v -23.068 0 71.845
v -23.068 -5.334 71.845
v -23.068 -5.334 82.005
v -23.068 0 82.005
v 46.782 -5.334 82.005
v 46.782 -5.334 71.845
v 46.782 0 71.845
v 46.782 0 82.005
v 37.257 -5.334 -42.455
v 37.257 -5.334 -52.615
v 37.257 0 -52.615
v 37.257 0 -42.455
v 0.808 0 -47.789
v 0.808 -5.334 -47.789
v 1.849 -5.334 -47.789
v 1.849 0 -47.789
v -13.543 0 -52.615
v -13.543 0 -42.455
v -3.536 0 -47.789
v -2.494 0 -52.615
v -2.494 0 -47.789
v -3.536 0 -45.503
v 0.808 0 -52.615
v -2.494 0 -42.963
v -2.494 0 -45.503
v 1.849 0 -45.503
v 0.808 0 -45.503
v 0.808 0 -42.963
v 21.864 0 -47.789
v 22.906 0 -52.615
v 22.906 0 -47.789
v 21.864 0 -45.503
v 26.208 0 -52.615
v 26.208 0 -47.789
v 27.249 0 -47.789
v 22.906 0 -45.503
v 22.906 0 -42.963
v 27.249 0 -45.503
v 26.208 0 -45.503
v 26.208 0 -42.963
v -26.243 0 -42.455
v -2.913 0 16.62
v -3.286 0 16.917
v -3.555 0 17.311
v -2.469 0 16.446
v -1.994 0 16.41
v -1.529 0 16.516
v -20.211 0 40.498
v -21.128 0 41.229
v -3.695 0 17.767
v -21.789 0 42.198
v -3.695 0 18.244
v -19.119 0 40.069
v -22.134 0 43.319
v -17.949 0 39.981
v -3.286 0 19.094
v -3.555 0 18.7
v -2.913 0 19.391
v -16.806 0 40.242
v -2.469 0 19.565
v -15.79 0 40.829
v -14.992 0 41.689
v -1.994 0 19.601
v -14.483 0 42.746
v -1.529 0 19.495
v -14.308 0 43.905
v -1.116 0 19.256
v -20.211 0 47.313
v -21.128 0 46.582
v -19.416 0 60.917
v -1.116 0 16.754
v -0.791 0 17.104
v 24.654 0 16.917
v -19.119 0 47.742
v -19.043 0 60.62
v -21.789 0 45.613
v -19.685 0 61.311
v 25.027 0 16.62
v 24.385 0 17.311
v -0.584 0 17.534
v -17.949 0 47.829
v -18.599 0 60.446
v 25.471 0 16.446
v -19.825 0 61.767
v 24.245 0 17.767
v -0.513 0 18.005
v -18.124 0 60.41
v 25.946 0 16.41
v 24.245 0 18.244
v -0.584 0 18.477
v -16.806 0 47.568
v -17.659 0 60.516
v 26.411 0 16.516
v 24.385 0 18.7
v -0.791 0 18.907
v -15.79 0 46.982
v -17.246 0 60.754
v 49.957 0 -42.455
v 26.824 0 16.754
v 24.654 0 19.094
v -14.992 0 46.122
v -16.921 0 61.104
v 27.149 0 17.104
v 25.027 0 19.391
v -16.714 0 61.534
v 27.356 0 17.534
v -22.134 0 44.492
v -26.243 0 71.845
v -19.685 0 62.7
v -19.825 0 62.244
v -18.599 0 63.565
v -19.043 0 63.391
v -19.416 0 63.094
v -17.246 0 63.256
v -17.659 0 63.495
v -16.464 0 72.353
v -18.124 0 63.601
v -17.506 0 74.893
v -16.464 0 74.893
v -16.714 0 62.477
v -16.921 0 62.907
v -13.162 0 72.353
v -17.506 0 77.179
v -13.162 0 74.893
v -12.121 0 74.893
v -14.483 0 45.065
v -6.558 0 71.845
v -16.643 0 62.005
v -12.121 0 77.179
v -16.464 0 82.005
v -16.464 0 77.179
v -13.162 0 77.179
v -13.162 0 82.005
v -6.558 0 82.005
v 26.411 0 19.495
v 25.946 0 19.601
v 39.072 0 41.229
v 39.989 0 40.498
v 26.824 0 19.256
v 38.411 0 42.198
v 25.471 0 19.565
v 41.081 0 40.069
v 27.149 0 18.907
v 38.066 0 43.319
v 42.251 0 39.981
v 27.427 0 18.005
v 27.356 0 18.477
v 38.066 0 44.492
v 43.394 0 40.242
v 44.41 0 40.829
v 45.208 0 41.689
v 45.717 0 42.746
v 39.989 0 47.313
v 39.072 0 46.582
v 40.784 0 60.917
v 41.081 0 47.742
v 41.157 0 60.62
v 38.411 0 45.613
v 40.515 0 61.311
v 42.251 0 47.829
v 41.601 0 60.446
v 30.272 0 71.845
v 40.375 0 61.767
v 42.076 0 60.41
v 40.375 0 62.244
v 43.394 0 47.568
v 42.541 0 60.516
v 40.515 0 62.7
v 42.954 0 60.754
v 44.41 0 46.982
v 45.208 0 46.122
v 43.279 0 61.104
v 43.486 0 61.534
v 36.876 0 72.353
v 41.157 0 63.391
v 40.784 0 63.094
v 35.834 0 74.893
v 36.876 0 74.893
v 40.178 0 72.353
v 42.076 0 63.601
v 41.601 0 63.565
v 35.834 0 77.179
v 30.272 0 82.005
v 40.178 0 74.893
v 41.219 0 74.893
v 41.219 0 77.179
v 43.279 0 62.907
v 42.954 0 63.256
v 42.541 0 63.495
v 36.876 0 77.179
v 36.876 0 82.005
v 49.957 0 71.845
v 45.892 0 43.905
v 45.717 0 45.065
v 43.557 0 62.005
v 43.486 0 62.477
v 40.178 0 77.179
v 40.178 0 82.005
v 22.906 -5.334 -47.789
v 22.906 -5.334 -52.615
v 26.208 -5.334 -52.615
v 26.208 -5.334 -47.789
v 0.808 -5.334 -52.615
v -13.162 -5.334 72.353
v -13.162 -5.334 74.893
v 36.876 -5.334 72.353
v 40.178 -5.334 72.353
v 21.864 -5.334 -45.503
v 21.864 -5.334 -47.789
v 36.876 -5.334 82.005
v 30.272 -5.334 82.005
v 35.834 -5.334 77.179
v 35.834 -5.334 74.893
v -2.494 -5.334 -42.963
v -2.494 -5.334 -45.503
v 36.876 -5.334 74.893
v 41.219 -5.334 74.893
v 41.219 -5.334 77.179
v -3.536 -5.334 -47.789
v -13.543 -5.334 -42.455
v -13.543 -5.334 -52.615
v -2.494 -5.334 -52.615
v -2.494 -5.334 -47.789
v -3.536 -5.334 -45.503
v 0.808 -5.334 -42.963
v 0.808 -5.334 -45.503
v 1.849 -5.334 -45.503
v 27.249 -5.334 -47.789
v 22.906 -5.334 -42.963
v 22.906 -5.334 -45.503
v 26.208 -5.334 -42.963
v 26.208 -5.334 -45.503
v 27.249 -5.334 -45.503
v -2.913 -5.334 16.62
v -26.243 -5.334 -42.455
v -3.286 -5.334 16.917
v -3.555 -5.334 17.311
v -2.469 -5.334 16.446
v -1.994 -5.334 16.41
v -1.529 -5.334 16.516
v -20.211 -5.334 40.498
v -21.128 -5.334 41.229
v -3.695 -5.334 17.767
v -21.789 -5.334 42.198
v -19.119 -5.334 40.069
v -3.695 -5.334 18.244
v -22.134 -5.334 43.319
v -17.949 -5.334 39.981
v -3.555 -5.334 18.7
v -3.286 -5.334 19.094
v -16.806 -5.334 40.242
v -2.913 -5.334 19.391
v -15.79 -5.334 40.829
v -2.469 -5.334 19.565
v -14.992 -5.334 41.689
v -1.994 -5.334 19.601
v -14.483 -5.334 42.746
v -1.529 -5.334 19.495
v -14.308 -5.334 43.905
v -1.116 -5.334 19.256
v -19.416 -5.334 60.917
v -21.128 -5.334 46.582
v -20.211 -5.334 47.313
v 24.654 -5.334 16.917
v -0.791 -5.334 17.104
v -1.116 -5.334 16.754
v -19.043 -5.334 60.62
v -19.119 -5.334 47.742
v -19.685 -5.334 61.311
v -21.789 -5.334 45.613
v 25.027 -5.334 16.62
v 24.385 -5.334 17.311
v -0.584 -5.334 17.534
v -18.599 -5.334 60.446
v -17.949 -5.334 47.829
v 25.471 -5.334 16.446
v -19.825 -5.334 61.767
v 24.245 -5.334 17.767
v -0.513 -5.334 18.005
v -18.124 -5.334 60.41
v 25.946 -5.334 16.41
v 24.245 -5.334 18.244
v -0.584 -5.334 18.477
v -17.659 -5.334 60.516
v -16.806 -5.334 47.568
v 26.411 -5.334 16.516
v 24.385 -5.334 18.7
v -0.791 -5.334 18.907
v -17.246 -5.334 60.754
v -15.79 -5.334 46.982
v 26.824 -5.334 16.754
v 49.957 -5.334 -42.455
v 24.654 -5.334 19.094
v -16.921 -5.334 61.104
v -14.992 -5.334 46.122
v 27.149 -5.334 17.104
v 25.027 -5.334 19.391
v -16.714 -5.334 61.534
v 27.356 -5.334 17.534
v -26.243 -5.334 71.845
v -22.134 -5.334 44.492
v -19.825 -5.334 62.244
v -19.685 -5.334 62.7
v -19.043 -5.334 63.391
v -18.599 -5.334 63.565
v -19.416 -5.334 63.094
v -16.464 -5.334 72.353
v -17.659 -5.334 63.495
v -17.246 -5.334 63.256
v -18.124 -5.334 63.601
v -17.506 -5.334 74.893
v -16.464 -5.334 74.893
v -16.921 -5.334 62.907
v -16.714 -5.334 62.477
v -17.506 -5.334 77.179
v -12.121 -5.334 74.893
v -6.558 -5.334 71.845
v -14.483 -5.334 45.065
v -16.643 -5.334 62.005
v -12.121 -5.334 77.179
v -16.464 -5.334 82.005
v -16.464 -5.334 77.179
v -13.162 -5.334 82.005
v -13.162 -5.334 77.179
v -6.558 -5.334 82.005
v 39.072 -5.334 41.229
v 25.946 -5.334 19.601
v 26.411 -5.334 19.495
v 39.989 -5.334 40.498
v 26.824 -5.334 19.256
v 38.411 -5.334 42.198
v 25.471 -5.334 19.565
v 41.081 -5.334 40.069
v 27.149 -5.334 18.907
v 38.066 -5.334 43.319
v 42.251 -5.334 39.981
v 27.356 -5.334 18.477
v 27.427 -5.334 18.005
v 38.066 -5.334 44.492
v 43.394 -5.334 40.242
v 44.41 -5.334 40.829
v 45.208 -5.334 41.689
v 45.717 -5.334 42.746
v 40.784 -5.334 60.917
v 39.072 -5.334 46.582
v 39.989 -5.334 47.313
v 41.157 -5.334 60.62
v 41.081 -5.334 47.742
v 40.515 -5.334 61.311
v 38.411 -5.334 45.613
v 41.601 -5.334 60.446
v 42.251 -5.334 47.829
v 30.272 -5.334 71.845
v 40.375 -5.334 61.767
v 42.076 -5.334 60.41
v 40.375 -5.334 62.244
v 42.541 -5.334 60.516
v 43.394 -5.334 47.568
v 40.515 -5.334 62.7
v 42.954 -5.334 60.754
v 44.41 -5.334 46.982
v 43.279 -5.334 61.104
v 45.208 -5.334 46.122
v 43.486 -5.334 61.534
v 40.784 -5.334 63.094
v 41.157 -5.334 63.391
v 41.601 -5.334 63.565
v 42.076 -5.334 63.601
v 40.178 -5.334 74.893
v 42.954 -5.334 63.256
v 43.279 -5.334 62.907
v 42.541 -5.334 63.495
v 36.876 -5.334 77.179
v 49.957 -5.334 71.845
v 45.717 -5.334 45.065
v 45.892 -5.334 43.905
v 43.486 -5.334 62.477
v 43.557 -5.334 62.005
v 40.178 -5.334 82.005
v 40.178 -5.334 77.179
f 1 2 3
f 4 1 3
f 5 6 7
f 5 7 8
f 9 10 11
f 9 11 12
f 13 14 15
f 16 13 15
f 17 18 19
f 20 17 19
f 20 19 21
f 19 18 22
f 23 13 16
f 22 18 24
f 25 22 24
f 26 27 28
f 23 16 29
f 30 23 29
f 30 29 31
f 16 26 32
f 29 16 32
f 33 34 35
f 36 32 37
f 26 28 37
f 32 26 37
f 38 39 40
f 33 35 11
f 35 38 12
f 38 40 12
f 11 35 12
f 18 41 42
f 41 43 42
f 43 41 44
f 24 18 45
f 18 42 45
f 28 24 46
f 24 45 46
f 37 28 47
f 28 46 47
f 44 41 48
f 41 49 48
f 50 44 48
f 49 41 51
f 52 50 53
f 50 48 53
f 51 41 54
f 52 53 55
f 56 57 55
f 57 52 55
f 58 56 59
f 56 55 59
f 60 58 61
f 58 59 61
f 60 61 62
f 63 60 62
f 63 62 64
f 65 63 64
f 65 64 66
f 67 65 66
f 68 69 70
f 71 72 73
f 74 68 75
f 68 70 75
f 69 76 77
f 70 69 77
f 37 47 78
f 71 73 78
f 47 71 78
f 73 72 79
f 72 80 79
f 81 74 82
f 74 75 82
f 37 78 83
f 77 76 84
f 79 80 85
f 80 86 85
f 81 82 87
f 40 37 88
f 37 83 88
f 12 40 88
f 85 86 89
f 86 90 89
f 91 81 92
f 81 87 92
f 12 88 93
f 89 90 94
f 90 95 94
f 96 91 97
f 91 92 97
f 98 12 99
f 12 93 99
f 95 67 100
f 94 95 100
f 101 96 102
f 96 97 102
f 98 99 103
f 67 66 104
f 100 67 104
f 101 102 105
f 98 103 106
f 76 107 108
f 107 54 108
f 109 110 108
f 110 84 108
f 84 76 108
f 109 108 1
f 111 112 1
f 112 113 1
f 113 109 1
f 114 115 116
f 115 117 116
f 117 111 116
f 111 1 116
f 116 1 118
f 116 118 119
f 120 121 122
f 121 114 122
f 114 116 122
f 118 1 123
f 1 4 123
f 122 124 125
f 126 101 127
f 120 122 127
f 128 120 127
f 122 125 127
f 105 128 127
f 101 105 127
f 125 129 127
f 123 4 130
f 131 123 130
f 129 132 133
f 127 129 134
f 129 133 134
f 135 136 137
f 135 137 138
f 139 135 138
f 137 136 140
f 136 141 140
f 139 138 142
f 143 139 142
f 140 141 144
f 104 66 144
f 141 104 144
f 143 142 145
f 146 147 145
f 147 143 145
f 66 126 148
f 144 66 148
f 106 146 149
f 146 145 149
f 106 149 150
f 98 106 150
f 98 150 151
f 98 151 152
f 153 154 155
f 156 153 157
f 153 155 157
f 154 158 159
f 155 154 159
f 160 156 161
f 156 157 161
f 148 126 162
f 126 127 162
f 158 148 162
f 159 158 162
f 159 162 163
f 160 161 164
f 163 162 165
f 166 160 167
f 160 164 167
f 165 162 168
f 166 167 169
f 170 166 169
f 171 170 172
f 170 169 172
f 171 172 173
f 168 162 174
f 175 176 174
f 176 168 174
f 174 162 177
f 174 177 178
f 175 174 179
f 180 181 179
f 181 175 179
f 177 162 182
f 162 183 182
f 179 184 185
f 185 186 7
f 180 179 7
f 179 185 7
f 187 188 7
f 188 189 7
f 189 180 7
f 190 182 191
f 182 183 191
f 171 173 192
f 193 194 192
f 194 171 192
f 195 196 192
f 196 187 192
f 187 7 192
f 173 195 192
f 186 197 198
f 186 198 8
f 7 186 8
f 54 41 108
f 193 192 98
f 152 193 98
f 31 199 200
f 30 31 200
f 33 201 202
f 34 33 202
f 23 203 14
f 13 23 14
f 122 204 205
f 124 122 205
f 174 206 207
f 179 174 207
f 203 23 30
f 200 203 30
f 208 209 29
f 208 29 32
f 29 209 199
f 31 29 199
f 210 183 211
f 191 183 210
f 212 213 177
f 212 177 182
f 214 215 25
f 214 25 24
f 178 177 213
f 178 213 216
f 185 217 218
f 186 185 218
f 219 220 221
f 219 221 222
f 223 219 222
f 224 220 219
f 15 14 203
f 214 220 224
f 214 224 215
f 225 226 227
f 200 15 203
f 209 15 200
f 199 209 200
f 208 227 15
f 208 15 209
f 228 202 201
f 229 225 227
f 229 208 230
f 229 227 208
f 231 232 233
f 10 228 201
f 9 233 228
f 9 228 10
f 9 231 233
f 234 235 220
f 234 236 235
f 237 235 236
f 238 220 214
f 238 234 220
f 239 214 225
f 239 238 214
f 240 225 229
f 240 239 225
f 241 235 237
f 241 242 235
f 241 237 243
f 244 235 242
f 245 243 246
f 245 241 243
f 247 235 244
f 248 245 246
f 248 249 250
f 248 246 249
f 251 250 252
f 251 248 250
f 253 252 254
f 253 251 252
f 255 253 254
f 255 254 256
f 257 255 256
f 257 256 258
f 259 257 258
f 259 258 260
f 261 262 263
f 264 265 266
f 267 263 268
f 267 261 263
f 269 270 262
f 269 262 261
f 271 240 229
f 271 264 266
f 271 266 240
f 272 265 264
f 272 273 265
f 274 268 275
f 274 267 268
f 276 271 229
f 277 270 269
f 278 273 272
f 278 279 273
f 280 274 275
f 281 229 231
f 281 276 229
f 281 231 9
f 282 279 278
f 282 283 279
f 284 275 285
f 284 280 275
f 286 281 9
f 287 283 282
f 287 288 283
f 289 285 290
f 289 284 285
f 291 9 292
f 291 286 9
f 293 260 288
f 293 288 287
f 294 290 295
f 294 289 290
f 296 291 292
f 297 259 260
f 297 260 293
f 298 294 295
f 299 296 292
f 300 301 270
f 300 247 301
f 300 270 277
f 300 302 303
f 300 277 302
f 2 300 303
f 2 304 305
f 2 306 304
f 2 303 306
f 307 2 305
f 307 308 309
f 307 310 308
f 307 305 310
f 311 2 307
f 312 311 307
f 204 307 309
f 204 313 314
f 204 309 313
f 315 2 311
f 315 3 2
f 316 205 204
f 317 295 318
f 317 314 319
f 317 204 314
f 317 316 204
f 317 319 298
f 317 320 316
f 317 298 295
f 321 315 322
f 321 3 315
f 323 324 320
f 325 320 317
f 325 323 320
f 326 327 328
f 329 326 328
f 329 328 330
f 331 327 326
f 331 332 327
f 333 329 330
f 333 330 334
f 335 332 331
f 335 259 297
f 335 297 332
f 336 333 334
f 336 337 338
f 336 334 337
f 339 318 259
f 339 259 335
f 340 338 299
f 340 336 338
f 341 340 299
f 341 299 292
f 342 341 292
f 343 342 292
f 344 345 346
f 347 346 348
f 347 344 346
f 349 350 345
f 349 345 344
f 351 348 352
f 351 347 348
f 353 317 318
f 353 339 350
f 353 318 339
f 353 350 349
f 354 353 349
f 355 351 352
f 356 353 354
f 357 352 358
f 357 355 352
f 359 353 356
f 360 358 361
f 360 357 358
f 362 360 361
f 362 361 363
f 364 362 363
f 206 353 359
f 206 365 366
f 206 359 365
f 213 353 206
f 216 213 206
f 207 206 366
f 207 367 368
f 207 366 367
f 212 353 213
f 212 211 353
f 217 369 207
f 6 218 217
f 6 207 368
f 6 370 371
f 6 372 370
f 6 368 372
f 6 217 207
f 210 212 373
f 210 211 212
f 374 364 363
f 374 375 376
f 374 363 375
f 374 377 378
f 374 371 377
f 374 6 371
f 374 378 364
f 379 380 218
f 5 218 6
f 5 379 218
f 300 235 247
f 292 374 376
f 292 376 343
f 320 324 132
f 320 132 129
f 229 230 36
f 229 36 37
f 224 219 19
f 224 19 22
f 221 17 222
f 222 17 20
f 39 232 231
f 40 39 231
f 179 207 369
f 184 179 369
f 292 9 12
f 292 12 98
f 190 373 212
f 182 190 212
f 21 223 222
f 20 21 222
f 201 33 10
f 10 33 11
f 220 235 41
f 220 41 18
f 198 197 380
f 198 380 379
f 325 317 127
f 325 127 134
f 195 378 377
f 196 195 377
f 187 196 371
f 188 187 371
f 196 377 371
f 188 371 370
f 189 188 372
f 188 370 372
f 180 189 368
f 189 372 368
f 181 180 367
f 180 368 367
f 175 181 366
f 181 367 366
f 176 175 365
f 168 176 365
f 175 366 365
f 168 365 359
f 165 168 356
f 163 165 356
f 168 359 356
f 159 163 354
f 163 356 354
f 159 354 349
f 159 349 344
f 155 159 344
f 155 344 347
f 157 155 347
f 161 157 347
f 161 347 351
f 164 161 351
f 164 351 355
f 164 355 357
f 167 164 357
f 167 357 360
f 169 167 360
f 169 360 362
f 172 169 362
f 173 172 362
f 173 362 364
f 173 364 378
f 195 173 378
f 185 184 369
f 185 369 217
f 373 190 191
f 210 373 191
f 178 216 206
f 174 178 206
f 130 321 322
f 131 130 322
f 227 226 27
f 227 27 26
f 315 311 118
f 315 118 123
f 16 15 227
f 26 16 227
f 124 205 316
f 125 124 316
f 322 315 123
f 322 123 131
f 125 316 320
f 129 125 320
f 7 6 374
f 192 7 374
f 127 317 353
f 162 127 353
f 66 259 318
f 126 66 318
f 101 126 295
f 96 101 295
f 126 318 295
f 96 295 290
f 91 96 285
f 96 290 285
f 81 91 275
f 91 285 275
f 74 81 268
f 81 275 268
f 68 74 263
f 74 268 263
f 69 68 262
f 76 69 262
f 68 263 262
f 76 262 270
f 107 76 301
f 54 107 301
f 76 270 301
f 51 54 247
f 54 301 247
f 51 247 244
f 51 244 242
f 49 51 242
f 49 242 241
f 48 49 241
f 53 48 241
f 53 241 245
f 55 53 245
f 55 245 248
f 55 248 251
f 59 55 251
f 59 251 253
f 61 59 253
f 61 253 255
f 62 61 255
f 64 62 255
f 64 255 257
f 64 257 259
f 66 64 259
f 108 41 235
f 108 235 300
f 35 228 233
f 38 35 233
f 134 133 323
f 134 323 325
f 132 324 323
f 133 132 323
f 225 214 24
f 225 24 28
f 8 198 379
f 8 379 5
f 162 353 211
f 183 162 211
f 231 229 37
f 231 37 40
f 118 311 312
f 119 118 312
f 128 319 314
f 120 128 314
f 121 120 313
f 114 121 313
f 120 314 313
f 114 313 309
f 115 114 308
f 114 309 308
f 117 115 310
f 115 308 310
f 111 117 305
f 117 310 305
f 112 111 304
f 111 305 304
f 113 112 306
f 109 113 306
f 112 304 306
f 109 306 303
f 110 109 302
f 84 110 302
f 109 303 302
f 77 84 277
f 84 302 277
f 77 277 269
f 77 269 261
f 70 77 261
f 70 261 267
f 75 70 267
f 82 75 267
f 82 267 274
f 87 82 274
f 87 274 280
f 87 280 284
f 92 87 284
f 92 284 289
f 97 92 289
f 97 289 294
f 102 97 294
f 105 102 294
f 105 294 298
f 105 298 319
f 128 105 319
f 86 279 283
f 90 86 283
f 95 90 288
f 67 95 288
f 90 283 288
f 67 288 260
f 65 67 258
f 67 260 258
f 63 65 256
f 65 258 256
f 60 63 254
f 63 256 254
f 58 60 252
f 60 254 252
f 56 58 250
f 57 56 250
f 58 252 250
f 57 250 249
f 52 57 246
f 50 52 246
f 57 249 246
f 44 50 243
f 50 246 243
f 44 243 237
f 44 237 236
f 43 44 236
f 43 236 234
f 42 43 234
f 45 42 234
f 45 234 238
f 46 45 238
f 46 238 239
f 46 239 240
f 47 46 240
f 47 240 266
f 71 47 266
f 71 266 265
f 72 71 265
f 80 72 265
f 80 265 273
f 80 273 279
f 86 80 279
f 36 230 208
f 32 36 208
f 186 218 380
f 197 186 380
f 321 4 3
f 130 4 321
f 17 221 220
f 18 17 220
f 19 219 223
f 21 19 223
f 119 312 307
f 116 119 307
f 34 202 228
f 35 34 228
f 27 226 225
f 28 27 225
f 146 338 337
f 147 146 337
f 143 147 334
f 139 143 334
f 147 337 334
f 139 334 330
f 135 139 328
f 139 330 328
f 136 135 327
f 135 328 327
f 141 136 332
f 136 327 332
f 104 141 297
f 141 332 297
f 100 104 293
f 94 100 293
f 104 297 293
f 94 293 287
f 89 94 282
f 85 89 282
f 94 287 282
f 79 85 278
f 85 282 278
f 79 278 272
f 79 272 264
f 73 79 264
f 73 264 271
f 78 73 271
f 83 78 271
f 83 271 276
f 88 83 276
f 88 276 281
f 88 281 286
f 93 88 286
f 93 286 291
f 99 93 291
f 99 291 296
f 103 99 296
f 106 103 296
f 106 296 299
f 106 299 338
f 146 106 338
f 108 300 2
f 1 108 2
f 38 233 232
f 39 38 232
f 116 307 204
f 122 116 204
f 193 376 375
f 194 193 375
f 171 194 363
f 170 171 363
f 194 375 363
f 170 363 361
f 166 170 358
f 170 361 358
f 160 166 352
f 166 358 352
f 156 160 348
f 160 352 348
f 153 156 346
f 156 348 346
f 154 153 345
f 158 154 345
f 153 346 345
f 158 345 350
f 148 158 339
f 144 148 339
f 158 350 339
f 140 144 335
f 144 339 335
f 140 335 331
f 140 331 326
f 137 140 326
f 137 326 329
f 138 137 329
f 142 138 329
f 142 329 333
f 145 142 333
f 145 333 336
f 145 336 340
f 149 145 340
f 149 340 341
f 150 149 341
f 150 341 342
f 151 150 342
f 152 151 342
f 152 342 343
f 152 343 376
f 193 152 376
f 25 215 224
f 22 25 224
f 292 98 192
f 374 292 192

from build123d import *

# Parameters (mm, degrees)
F0_W      = 76.2
F0_H      = 134.62
F1_DEPTH  = 5.334
F2_W      = 12.7
F2_H      = 10.16
F3_DEPTH  = 25.4
F4_W      = 3.302
F4_H      = 4.826
F4_H_2    = 2.286
F4_W_2    = 1.0414
F4_H_3    = 2.54
F5_DEPTH  = 25.4
F6_W      = 3.175
F6_H      = 10.16
F6_W_2    = 36.83
F7_DEPTH  = 25.4
F8_W      = 3.302
F8_H      = 4.826
F8_H_2    = 2.286
F8_H_3    = 2.54
F8_W_2    = 1.0414
F9_DEPTH  = 25.4
F10_R     = 1.6
F10_R_2   = 3.935
F11_DEPTH = 25.4


with BuildPart() as f1:
    # F0 (on Front) → F1 (new body)
    with BuildSketch(Plane.XZ):
        with Locations((11.8567193806, 14.6954228854)):
            Rectangle(F0_W, F0_H)
    extrude(amount=F1_DEPTH)

    # F2 (on face) → F3 (cut)
    with BuildSketch(Plane.XZ.offset(5.334)):
        with Locations((-19.8932806194, -47.5345771146)):
            Rectangle(F2_W, F2_H)
        with Locations((43.6067193806, -47.5345771146)):
            Rectangle(F2_W, F2_H)
    extrude(amount=-F3_DEPTH, mode=Mode.SUBTRACT)

    # F4 (on face) → F5 (cut)
    with BuildSketch(Plane.XZ.offset(5.334)):
        with Locations((-0.8432806194, -50.2015771146)):
            Rectangle(F4_W, F4_H)
        with Locations((-0.8432806194, -46.6455771146)):
            Rectangle(F4_W, F4_H_2)
        with Locations((-3.0149806194, -46.6455771146)):
            Rectangle(F4_W_2, F4_H_2)
        with Locations((-0.8432806194, -44.2325771146)):
            Rectangle(F4_W, F4_H_3)
        with Locations((1.3284193806, -46.6455771146)):
            Rectangle(F4_W_2, F4_H_2)
        with Locations((24.5567193806, -50.2015771146)):
            Rectangle(F4_W, F4_H)
        with Locations((24.5567193806, -46.6455771146)):
            Rectangle(F4_W, F4_H_2)
        with Locations((22.3850193806, -46.6455771146)):
            Rectangle(F4_W_2, F4_H_2)
        with Locations((26.7284193806, -46.6455771146)):
            Rectangle(F4_W_2, F4_H_2)
        with Locations((24.5567193806, -44.2325771146)):
            Rectangle(F4_W, F4_H_3)
    extrude(amount=-F5_DEPTH, mode=Mode.SUBTRACT)

    # F6 (on face) → F7 (cut)
    with BuildSketch(Plane.XZ.offset(5.334)):
        with Locations((-24.6557806194, 76.9254228854)):
            Rectangle(F6_W, F6_H)
        with Locations((11.8567193806, 76.9254228854)):
            Rectangle(F6_W_2, F6_H)
        with Locations((48.3692193806, 76.9254228854)):
            Rectangle(F6_W, F6_H)
    extrude(amount=-F7_DEPTH, mode=Mode.SUBTRACT)

    # F8 (on face) → F9 (cut)
    with BuildSketch(Plane.XZ.offset(5.334)):
        with Locations((-14.8132806194, 79.5924228854)):
            Rectangle(F8_W, F8_H)
        with Locations((-14.8132806194, 76.0364228854)):
            Rectangle(F8_W, F8_H_2)
        with Locations((-14.8132806194, 73.6234228854)):
            Rectangle(F8_W, F8_H_3)
        with Locations((-16.9849806194, 76.0364228854)):
            Rectangle(F8_W_2, F8_H_2)
        with Locations((-12.6415806194, 76.0364228854)):
            Rectangle(F8_W_2, F8_H_2)
        with Locations((38.5267193806, 73.6234228854)):
            Rectangle(F8_W, F8_H_3)
        with Locations((38.5267193806, 76.0364228854)):
            Rectangle(F8_W, F8_H_2)
        with Locations((36.3550193806, 76.0364228854)):
            Rectangle(F8_W_2, F8_H_2)
        with Locations((40.6984193806, 76.0364228854)):
            Rectangle(F8_W_2, F8_H_2)
        with Locations((38.5267193806, 79.5924228854)):
            Rectangle(F8_W, F8_H)
    extrude(amount=-F9_DEPTH, mode=Mode.SUBTRACT)

    # F10 (on face) → F11 (cut)
    with BuildSketch(Plane.XZ.offset(5.334)):
        with Locations((-18.2432806194, 62.0054228854)):
            Circle(F10_R)
        with Locations((41.9567193806, 62.0054228854)):
            Circle(F10_R)
        with Locations((-18.2432806194, 43.9054228854)):
            Circle(F10_R_2)
        with Locations((41.9567193806, 43.9054228854)):
            Circle(F10_R_2)
        with Locations((-2.1132806194, 18.0054228854)):
            Circle(F10_R)
        with Locations((25.8267193806, 18.0054228854)):
            Circle(F10_R)
    extrude(amount=-F11_DEPTH, mode=Mode.SUBTRACT)


solid = f1.part
